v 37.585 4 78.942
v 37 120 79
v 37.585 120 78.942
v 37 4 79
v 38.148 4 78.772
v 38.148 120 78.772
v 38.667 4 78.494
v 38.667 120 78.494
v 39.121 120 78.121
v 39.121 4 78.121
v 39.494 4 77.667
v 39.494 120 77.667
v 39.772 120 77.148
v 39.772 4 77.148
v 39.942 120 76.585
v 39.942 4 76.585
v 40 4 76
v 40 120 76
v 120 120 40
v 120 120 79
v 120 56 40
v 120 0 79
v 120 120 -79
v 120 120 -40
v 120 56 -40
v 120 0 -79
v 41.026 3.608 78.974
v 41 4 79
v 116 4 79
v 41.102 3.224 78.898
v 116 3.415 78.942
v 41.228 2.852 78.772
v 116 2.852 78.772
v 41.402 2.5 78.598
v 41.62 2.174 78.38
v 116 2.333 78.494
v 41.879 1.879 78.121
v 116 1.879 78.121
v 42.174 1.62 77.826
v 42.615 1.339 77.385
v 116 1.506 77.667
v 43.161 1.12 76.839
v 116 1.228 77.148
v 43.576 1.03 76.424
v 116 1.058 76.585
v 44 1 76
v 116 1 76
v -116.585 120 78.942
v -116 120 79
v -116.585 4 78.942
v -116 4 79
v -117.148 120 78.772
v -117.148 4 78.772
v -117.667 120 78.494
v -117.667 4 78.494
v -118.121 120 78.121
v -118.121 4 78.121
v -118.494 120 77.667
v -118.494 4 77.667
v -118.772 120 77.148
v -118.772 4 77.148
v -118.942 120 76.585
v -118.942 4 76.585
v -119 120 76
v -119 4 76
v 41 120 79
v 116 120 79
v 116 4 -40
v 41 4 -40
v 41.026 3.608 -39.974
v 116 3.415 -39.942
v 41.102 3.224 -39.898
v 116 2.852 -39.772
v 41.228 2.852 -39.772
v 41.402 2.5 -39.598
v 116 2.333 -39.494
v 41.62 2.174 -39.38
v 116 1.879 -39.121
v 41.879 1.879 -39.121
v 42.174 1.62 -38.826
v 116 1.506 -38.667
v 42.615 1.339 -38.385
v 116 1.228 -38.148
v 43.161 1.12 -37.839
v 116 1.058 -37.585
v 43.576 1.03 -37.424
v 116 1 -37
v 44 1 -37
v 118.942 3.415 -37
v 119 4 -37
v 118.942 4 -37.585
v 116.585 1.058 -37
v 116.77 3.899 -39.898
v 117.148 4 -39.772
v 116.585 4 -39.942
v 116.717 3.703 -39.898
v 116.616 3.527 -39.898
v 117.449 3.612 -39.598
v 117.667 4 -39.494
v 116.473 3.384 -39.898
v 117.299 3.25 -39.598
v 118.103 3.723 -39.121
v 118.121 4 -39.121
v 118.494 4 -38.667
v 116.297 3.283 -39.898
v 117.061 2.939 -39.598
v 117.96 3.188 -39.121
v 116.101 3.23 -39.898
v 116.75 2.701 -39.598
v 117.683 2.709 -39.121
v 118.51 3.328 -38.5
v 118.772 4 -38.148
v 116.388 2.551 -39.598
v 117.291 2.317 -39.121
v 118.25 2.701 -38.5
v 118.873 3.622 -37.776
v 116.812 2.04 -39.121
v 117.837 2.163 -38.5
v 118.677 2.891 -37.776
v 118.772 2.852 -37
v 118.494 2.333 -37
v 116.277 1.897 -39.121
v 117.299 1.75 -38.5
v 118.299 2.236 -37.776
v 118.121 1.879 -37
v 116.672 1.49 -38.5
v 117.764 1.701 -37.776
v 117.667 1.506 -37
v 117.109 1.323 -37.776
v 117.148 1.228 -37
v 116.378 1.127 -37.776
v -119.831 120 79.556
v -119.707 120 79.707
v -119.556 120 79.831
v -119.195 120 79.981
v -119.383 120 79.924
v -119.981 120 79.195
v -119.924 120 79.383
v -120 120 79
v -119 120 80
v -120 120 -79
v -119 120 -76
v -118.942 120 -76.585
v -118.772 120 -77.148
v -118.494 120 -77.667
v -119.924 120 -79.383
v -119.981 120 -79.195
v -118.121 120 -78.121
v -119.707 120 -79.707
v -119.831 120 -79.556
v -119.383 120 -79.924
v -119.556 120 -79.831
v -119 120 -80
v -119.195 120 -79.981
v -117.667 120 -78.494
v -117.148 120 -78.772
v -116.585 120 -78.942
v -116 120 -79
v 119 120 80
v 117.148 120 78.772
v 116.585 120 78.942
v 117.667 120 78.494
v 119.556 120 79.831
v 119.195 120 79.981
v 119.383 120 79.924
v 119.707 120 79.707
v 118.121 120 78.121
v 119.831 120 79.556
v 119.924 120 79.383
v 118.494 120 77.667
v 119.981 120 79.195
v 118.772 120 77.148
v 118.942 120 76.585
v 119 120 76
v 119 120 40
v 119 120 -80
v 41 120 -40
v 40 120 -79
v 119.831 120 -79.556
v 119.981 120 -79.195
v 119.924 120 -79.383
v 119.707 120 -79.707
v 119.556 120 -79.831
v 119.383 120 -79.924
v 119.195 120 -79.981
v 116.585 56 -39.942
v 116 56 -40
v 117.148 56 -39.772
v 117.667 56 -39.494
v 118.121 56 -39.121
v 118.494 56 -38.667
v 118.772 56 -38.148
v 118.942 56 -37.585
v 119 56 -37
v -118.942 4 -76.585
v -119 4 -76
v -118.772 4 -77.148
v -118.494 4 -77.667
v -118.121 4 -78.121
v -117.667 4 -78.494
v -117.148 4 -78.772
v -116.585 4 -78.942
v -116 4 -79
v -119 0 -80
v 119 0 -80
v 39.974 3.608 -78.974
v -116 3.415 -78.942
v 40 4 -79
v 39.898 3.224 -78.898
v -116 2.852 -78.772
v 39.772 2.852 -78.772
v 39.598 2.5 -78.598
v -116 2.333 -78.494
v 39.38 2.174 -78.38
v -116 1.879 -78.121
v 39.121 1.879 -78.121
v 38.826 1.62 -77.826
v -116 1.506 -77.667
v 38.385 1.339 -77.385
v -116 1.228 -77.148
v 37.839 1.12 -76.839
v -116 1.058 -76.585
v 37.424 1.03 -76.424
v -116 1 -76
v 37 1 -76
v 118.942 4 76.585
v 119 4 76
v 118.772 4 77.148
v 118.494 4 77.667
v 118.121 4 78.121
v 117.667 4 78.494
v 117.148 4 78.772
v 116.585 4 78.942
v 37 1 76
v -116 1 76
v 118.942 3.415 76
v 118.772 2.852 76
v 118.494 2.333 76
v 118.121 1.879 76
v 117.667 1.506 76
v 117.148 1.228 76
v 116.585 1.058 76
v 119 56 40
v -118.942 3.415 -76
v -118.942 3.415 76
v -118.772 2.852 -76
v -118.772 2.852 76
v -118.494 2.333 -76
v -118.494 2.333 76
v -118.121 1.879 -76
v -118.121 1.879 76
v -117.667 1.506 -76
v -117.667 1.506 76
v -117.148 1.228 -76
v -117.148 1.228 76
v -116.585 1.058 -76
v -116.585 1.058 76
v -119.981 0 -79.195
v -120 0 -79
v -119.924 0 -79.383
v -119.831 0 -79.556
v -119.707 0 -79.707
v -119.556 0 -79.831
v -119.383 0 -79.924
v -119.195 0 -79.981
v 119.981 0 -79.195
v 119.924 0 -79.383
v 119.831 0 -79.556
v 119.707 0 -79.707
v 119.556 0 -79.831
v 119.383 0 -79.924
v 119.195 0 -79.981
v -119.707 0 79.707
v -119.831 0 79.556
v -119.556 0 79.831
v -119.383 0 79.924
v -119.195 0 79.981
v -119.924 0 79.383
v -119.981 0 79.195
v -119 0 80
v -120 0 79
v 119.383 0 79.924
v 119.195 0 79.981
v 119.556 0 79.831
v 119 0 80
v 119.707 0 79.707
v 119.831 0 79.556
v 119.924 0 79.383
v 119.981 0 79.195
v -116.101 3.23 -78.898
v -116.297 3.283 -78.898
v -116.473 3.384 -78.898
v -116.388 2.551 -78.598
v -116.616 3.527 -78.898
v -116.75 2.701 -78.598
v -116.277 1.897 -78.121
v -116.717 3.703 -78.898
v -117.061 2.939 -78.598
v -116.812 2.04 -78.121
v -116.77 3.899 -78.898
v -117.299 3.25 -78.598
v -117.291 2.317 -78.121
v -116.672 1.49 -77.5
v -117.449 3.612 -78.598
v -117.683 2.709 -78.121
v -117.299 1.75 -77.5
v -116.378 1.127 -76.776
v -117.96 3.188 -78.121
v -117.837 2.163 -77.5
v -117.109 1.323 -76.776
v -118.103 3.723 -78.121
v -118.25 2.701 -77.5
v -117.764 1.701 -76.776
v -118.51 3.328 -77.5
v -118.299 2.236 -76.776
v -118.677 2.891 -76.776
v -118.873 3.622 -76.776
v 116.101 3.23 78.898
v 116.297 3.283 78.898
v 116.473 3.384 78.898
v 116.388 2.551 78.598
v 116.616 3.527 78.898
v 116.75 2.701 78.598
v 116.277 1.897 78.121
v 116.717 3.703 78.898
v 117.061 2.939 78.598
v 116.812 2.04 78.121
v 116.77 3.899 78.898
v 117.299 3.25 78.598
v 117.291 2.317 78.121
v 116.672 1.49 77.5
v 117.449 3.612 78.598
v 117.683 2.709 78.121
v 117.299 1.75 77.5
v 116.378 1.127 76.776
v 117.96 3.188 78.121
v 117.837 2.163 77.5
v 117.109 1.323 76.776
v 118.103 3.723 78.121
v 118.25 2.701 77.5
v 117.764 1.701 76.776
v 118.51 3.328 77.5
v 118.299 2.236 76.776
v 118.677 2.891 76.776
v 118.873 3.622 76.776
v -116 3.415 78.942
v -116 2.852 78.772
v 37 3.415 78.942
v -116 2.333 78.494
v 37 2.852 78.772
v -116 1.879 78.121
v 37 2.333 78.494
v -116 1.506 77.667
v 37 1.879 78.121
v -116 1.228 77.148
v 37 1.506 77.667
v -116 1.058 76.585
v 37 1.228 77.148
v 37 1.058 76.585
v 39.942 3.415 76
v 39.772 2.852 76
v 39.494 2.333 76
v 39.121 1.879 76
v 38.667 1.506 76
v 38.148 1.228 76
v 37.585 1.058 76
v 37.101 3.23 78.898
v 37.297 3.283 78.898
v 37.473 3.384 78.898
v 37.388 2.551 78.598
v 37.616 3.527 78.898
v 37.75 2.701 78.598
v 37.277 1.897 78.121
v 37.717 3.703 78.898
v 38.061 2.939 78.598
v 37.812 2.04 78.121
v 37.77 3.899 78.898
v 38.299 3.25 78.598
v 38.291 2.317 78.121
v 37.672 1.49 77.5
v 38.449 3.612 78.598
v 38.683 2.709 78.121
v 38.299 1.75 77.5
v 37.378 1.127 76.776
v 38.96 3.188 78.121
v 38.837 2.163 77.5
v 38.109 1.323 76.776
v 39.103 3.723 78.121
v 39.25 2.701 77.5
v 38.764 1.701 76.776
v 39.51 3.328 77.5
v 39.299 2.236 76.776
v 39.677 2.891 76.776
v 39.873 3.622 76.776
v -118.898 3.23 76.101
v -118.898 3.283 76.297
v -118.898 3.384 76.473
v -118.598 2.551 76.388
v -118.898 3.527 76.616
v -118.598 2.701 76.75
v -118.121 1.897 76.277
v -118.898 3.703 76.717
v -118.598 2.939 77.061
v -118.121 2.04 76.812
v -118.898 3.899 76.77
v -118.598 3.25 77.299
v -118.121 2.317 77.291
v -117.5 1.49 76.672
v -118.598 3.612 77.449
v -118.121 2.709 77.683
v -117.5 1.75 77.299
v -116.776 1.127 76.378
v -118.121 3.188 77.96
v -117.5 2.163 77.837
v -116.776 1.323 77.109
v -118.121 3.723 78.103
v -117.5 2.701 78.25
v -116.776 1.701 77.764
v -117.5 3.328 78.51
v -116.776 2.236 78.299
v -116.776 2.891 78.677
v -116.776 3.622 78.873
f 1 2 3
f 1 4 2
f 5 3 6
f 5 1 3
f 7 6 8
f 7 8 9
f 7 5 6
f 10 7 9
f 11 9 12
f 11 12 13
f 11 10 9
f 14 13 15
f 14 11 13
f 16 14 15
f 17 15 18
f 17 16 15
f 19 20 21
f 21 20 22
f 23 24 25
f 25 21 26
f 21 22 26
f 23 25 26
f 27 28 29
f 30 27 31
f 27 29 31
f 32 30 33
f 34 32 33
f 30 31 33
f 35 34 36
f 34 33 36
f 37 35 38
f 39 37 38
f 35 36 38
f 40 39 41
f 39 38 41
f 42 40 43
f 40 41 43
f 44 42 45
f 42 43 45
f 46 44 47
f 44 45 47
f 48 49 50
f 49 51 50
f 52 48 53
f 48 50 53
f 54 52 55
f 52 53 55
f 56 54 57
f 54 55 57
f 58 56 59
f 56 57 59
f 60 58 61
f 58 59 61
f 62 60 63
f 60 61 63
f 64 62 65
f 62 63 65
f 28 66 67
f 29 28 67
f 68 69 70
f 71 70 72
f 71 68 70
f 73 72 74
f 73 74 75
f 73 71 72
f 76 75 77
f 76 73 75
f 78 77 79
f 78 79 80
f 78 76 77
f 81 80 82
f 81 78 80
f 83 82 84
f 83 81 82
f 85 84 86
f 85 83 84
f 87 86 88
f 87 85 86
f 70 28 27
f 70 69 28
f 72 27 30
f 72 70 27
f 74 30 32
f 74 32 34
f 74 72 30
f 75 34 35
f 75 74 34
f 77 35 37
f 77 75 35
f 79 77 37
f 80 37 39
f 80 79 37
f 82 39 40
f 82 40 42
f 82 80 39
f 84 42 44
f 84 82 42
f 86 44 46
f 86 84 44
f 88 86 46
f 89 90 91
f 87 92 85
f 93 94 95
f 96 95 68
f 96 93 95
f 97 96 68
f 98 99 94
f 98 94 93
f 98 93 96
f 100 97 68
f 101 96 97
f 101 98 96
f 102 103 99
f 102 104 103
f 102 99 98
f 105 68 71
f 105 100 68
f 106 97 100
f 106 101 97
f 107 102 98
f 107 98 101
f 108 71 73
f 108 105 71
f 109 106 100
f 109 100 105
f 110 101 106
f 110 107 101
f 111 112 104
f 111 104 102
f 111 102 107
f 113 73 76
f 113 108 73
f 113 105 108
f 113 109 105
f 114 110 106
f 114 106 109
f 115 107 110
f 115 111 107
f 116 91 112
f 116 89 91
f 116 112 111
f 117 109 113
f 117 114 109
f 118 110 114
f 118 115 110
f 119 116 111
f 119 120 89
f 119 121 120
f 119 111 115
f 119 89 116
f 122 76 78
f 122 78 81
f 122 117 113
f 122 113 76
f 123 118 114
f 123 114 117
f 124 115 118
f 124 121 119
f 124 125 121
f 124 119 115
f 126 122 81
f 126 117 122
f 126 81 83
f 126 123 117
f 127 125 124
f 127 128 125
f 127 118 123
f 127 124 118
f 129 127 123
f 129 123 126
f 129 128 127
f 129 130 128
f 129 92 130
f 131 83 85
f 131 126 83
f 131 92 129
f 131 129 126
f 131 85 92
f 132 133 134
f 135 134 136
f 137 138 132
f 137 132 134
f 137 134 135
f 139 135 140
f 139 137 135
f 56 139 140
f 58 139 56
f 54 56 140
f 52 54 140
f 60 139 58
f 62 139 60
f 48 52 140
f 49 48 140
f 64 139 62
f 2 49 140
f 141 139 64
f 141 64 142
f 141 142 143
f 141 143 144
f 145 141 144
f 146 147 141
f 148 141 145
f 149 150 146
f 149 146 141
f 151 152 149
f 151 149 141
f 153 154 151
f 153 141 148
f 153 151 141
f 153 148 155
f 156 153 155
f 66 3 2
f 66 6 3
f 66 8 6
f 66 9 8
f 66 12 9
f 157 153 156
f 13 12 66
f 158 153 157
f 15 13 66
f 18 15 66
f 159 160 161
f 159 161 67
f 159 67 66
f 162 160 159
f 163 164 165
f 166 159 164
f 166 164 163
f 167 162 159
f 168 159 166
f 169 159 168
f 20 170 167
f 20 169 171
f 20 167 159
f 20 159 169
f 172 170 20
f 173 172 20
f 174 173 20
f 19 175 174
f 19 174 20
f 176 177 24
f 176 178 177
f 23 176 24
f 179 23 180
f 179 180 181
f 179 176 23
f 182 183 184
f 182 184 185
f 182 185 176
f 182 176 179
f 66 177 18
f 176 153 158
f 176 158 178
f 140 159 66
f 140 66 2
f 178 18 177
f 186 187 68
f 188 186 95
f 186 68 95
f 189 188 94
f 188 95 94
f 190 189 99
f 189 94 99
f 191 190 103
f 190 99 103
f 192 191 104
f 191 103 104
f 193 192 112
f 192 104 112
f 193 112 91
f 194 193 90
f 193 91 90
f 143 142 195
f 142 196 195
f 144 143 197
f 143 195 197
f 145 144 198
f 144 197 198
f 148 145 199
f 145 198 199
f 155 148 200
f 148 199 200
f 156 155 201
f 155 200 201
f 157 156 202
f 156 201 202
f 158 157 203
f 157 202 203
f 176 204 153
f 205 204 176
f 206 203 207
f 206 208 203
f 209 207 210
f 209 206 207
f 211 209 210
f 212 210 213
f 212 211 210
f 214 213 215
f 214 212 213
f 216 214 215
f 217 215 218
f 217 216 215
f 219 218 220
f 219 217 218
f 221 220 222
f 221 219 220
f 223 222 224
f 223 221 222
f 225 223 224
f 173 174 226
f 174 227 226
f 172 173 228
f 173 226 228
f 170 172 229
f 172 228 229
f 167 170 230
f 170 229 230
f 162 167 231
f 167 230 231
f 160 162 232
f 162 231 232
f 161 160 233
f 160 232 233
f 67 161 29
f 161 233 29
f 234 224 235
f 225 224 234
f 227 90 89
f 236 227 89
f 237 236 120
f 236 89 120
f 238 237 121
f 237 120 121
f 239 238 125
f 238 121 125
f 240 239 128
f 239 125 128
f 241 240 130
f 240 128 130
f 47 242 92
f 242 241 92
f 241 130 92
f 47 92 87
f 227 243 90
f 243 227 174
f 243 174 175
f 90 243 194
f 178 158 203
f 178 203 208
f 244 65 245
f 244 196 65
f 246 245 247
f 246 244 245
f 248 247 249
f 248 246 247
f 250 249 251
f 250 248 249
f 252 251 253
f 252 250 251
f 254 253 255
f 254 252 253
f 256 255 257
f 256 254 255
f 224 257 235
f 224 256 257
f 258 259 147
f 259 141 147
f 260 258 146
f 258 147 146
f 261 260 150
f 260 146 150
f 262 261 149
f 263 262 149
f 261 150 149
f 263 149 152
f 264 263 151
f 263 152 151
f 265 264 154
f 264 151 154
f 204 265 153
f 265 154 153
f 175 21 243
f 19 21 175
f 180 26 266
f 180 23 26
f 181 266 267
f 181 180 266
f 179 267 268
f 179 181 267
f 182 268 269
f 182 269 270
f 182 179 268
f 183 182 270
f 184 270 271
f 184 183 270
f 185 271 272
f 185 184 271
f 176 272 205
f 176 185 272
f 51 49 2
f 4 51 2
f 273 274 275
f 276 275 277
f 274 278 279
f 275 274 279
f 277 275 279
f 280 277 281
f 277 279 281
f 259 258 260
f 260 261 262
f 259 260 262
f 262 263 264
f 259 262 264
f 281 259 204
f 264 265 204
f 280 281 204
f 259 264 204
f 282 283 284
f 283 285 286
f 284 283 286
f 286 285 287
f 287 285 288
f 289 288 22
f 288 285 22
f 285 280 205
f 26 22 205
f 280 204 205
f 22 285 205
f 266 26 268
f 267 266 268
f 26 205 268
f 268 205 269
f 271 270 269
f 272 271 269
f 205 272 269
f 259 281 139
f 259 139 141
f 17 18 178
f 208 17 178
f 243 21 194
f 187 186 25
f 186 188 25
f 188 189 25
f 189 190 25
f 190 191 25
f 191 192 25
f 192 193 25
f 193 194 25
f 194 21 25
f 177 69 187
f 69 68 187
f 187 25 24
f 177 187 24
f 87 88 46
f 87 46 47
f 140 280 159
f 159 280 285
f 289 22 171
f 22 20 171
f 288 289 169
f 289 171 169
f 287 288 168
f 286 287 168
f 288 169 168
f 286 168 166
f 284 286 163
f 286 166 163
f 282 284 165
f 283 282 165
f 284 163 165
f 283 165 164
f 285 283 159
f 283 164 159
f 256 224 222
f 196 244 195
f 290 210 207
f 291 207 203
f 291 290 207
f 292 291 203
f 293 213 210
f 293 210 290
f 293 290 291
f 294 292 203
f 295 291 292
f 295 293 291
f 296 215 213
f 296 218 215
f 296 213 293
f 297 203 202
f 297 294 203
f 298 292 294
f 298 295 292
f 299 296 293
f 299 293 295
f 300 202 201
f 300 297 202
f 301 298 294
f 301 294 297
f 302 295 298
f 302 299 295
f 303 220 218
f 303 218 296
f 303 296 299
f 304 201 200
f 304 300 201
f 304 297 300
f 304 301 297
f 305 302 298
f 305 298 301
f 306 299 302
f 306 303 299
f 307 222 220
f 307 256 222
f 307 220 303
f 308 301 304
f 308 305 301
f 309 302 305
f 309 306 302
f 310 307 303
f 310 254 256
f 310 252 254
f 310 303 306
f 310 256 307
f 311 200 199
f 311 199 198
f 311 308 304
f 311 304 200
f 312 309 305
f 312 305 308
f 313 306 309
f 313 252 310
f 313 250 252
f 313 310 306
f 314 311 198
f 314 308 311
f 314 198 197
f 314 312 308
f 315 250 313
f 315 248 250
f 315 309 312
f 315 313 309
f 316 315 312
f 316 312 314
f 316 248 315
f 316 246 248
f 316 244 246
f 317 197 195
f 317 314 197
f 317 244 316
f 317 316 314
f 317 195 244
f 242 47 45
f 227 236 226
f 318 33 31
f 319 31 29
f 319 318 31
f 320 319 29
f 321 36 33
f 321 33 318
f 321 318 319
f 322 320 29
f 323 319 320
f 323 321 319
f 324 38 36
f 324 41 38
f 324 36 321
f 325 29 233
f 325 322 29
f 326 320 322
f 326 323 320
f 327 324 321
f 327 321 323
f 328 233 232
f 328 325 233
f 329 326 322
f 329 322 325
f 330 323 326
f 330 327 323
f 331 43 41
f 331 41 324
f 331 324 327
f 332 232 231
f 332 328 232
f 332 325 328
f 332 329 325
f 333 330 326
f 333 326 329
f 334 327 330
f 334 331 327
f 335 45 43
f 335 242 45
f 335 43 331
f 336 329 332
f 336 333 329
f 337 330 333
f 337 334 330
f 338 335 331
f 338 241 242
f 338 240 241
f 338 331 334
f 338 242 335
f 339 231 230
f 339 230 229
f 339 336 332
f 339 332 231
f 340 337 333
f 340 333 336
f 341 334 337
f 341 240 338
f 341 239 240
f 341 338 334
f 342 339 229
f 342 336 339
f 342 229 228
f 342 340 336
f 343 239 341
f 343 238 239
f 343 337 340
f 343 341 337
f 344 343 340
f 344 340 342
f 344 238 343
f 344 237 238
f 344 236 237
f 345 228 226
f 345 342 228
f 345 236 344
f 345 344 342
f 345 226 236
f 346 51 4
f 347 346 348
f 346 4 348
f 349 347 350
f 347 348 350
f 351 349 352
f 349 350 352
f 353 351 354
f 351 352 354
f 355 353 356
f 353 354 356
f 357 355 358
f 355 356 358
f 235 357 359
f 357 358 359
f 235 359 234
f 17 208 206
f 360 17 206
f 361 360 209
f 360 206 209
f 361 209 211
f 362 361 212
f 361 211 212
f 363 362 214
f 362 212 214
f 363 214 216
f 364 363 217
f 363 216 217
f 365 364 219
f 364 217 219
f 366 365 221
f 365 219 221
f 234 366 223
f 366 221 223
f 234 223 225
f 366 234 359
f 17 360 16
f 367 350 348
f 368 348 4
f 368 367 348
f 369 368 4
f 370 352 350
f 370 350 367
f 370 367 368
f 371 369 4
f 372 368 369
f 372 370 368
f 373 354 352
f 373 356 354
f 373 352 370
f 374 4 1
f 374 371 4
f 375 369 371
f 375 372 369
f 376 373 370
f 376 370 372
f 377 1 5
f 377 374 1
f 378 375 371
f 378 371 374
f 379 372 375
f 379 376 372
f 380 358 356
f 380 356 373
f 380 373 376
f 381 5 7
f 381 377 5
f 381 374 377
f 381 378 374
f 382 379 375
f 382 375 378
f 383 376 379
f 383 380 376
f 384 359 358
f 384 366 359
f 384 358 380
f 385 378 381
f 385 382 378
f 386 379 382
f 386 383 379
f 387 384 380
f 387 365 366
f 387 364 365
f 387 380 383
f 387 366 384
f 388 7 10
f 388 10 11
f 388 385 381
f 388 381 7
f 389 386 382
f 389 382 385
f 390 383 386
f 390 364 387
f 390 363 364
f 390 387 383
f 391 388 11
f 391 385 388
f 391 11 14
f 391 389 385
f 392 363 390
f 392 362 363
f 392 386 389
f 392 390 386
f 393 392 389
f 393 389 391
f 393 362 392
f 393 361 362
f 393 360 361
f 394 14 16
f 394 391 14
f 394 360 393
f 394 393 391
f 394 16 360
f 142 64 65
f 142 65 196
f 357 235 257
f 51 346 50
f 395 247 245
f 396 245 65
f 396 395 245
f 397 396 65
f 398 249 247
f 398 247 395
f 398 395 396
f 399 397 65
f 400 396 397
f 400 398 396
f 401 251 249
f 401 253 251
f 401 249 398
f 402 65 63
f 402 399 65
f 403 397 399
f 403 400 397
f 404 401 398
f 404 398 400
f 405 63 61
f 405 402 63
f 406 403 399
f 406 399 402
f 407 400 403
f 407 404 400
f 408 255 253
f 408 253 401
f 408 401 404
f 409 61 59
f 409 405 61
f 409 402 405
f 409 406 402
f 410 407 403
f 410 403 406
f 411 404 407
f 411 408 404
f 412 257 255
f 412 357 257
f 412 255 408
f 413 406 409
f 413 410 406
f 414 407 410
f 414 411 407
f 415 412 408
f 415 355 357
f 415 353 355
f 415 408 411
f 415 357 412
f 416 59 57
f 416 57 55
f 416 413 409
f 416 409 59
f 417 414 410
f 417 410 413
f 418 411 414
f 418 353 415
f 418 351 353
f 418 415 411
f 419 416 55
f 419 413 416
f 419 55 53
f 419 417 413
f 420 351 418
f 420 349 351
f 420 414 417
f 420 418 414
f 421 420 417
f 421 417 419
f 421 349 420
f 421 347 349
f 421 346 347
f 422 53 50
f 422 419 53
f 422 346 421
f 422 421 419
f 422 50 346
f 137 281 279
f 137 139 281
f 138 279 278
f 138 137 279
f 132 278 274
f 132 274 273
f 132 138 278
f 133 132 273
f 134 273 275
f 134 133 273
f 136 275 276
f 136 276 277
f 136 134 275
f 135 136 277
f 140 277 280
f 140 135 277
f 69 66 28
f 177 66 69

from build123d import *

# Parameters (mm, degrees)
SKETCH_1_W          = 240
SKETCH_1_H          = 160
EXTRUDE_1_DEPTH     = 120
SKETCH_2_W          = 159
SKETCH_2_H          = 158
SKETCH_2_W_2        = 78
SKETCH_2_H_2        = 119
CUT_EXTRUDE_1_DEPTH = 119
CUT_EXTRUDE_2_REACH = 242
SKETCH_3_W          = 80
SKETCH_3_H          = 64
FILLET_1_R          = 1
FILLET_2_R          = 3


with BuildPart() as part:
    # 草圖1 → 填料-伸長1 (new body)
    with BuildSketch(Plane(origin=(0, 0, 0), x_dir=(1, 0, 0), z_dir=(0, 1, 0))):
        Rectangle(SKETCH_1_W, SKETCH_1_H)
    extrude(amount=EXTRUDE_1_DEPTH)

    # 草圖2 → 除料-伸長1 (cut)
    with BuildSketch(Plane(origin=(0, 120, 0), x_dir=(1, 0, 0), z_dir=(0, 1, 0))):
        with Locations((-39.5, 0)):
            Rectangle(SKETCH_2_W, SKETCH_2_H)
        with Locations((80, -19.5)):
            Rectangle(SKETCH_2_W_2, SKETCH_2_H_2)
    extrude(amount=-CUT_EXTRUDE_1_DEPTH, mode=Mode.SUBTRACT)

    # 草圖3 → 除料-伸長2 (cut, up to next)
    with BuildSketch(Plane(origin=(120, 0, 0), x_dir=(0, 0, -1), z_dir=(1, 0, 0)), mode=Mode.PRIVATE) as cut_extrude_2_sk1:
        with Locations((0, 88)):
            Rectangle(SKETCH_3_W, SKETCH_3_H)
    cut_extrude_2_tool1 = extrude(cut_extrude_2_sk1.sketch, amount=-CUT_EXTRUDE_2_REACH, mode=Mode.PRIVATE) & part.part
    add(cut_extrude_2_tool1.solids().sort_by_distance((120, 88, 0))[0], mode=Mode.SUBTRACT)

    # 圓角1
    fillet_1_edges = [part.edges().sort_by_distance(p)[0] for p in [
        (120, 60, 80),
        (-120, 60, 80),
        (-120, 60, -80),
        (120, 60, -80),
    ]]
    fillet(fillet_1_edges, radius=FILLET_1_R)

    # 圓角2
    fillet_2_edges = [part.edges().sort_by_distance(p)[0] for p in [
        (40, 1, 0),
        (-39.5, 1, 79),
        (40, 60.5, 79),
        (-119, 1, 0),
        (-119, 60.5, 79),
        (-39.5, 1, -79),
        (-119, 60.5, -79),
        (119, 1, 19.5),
        (119, 28.5, -40),
        (80, 1, 79),
        (119, 60.5, 79),
        (41, 1, 19.5),
        (80, 1, -40),
    ]]
    fillet(fillet_2_edges, radius=FILLET_2_R)


solid = part.part
